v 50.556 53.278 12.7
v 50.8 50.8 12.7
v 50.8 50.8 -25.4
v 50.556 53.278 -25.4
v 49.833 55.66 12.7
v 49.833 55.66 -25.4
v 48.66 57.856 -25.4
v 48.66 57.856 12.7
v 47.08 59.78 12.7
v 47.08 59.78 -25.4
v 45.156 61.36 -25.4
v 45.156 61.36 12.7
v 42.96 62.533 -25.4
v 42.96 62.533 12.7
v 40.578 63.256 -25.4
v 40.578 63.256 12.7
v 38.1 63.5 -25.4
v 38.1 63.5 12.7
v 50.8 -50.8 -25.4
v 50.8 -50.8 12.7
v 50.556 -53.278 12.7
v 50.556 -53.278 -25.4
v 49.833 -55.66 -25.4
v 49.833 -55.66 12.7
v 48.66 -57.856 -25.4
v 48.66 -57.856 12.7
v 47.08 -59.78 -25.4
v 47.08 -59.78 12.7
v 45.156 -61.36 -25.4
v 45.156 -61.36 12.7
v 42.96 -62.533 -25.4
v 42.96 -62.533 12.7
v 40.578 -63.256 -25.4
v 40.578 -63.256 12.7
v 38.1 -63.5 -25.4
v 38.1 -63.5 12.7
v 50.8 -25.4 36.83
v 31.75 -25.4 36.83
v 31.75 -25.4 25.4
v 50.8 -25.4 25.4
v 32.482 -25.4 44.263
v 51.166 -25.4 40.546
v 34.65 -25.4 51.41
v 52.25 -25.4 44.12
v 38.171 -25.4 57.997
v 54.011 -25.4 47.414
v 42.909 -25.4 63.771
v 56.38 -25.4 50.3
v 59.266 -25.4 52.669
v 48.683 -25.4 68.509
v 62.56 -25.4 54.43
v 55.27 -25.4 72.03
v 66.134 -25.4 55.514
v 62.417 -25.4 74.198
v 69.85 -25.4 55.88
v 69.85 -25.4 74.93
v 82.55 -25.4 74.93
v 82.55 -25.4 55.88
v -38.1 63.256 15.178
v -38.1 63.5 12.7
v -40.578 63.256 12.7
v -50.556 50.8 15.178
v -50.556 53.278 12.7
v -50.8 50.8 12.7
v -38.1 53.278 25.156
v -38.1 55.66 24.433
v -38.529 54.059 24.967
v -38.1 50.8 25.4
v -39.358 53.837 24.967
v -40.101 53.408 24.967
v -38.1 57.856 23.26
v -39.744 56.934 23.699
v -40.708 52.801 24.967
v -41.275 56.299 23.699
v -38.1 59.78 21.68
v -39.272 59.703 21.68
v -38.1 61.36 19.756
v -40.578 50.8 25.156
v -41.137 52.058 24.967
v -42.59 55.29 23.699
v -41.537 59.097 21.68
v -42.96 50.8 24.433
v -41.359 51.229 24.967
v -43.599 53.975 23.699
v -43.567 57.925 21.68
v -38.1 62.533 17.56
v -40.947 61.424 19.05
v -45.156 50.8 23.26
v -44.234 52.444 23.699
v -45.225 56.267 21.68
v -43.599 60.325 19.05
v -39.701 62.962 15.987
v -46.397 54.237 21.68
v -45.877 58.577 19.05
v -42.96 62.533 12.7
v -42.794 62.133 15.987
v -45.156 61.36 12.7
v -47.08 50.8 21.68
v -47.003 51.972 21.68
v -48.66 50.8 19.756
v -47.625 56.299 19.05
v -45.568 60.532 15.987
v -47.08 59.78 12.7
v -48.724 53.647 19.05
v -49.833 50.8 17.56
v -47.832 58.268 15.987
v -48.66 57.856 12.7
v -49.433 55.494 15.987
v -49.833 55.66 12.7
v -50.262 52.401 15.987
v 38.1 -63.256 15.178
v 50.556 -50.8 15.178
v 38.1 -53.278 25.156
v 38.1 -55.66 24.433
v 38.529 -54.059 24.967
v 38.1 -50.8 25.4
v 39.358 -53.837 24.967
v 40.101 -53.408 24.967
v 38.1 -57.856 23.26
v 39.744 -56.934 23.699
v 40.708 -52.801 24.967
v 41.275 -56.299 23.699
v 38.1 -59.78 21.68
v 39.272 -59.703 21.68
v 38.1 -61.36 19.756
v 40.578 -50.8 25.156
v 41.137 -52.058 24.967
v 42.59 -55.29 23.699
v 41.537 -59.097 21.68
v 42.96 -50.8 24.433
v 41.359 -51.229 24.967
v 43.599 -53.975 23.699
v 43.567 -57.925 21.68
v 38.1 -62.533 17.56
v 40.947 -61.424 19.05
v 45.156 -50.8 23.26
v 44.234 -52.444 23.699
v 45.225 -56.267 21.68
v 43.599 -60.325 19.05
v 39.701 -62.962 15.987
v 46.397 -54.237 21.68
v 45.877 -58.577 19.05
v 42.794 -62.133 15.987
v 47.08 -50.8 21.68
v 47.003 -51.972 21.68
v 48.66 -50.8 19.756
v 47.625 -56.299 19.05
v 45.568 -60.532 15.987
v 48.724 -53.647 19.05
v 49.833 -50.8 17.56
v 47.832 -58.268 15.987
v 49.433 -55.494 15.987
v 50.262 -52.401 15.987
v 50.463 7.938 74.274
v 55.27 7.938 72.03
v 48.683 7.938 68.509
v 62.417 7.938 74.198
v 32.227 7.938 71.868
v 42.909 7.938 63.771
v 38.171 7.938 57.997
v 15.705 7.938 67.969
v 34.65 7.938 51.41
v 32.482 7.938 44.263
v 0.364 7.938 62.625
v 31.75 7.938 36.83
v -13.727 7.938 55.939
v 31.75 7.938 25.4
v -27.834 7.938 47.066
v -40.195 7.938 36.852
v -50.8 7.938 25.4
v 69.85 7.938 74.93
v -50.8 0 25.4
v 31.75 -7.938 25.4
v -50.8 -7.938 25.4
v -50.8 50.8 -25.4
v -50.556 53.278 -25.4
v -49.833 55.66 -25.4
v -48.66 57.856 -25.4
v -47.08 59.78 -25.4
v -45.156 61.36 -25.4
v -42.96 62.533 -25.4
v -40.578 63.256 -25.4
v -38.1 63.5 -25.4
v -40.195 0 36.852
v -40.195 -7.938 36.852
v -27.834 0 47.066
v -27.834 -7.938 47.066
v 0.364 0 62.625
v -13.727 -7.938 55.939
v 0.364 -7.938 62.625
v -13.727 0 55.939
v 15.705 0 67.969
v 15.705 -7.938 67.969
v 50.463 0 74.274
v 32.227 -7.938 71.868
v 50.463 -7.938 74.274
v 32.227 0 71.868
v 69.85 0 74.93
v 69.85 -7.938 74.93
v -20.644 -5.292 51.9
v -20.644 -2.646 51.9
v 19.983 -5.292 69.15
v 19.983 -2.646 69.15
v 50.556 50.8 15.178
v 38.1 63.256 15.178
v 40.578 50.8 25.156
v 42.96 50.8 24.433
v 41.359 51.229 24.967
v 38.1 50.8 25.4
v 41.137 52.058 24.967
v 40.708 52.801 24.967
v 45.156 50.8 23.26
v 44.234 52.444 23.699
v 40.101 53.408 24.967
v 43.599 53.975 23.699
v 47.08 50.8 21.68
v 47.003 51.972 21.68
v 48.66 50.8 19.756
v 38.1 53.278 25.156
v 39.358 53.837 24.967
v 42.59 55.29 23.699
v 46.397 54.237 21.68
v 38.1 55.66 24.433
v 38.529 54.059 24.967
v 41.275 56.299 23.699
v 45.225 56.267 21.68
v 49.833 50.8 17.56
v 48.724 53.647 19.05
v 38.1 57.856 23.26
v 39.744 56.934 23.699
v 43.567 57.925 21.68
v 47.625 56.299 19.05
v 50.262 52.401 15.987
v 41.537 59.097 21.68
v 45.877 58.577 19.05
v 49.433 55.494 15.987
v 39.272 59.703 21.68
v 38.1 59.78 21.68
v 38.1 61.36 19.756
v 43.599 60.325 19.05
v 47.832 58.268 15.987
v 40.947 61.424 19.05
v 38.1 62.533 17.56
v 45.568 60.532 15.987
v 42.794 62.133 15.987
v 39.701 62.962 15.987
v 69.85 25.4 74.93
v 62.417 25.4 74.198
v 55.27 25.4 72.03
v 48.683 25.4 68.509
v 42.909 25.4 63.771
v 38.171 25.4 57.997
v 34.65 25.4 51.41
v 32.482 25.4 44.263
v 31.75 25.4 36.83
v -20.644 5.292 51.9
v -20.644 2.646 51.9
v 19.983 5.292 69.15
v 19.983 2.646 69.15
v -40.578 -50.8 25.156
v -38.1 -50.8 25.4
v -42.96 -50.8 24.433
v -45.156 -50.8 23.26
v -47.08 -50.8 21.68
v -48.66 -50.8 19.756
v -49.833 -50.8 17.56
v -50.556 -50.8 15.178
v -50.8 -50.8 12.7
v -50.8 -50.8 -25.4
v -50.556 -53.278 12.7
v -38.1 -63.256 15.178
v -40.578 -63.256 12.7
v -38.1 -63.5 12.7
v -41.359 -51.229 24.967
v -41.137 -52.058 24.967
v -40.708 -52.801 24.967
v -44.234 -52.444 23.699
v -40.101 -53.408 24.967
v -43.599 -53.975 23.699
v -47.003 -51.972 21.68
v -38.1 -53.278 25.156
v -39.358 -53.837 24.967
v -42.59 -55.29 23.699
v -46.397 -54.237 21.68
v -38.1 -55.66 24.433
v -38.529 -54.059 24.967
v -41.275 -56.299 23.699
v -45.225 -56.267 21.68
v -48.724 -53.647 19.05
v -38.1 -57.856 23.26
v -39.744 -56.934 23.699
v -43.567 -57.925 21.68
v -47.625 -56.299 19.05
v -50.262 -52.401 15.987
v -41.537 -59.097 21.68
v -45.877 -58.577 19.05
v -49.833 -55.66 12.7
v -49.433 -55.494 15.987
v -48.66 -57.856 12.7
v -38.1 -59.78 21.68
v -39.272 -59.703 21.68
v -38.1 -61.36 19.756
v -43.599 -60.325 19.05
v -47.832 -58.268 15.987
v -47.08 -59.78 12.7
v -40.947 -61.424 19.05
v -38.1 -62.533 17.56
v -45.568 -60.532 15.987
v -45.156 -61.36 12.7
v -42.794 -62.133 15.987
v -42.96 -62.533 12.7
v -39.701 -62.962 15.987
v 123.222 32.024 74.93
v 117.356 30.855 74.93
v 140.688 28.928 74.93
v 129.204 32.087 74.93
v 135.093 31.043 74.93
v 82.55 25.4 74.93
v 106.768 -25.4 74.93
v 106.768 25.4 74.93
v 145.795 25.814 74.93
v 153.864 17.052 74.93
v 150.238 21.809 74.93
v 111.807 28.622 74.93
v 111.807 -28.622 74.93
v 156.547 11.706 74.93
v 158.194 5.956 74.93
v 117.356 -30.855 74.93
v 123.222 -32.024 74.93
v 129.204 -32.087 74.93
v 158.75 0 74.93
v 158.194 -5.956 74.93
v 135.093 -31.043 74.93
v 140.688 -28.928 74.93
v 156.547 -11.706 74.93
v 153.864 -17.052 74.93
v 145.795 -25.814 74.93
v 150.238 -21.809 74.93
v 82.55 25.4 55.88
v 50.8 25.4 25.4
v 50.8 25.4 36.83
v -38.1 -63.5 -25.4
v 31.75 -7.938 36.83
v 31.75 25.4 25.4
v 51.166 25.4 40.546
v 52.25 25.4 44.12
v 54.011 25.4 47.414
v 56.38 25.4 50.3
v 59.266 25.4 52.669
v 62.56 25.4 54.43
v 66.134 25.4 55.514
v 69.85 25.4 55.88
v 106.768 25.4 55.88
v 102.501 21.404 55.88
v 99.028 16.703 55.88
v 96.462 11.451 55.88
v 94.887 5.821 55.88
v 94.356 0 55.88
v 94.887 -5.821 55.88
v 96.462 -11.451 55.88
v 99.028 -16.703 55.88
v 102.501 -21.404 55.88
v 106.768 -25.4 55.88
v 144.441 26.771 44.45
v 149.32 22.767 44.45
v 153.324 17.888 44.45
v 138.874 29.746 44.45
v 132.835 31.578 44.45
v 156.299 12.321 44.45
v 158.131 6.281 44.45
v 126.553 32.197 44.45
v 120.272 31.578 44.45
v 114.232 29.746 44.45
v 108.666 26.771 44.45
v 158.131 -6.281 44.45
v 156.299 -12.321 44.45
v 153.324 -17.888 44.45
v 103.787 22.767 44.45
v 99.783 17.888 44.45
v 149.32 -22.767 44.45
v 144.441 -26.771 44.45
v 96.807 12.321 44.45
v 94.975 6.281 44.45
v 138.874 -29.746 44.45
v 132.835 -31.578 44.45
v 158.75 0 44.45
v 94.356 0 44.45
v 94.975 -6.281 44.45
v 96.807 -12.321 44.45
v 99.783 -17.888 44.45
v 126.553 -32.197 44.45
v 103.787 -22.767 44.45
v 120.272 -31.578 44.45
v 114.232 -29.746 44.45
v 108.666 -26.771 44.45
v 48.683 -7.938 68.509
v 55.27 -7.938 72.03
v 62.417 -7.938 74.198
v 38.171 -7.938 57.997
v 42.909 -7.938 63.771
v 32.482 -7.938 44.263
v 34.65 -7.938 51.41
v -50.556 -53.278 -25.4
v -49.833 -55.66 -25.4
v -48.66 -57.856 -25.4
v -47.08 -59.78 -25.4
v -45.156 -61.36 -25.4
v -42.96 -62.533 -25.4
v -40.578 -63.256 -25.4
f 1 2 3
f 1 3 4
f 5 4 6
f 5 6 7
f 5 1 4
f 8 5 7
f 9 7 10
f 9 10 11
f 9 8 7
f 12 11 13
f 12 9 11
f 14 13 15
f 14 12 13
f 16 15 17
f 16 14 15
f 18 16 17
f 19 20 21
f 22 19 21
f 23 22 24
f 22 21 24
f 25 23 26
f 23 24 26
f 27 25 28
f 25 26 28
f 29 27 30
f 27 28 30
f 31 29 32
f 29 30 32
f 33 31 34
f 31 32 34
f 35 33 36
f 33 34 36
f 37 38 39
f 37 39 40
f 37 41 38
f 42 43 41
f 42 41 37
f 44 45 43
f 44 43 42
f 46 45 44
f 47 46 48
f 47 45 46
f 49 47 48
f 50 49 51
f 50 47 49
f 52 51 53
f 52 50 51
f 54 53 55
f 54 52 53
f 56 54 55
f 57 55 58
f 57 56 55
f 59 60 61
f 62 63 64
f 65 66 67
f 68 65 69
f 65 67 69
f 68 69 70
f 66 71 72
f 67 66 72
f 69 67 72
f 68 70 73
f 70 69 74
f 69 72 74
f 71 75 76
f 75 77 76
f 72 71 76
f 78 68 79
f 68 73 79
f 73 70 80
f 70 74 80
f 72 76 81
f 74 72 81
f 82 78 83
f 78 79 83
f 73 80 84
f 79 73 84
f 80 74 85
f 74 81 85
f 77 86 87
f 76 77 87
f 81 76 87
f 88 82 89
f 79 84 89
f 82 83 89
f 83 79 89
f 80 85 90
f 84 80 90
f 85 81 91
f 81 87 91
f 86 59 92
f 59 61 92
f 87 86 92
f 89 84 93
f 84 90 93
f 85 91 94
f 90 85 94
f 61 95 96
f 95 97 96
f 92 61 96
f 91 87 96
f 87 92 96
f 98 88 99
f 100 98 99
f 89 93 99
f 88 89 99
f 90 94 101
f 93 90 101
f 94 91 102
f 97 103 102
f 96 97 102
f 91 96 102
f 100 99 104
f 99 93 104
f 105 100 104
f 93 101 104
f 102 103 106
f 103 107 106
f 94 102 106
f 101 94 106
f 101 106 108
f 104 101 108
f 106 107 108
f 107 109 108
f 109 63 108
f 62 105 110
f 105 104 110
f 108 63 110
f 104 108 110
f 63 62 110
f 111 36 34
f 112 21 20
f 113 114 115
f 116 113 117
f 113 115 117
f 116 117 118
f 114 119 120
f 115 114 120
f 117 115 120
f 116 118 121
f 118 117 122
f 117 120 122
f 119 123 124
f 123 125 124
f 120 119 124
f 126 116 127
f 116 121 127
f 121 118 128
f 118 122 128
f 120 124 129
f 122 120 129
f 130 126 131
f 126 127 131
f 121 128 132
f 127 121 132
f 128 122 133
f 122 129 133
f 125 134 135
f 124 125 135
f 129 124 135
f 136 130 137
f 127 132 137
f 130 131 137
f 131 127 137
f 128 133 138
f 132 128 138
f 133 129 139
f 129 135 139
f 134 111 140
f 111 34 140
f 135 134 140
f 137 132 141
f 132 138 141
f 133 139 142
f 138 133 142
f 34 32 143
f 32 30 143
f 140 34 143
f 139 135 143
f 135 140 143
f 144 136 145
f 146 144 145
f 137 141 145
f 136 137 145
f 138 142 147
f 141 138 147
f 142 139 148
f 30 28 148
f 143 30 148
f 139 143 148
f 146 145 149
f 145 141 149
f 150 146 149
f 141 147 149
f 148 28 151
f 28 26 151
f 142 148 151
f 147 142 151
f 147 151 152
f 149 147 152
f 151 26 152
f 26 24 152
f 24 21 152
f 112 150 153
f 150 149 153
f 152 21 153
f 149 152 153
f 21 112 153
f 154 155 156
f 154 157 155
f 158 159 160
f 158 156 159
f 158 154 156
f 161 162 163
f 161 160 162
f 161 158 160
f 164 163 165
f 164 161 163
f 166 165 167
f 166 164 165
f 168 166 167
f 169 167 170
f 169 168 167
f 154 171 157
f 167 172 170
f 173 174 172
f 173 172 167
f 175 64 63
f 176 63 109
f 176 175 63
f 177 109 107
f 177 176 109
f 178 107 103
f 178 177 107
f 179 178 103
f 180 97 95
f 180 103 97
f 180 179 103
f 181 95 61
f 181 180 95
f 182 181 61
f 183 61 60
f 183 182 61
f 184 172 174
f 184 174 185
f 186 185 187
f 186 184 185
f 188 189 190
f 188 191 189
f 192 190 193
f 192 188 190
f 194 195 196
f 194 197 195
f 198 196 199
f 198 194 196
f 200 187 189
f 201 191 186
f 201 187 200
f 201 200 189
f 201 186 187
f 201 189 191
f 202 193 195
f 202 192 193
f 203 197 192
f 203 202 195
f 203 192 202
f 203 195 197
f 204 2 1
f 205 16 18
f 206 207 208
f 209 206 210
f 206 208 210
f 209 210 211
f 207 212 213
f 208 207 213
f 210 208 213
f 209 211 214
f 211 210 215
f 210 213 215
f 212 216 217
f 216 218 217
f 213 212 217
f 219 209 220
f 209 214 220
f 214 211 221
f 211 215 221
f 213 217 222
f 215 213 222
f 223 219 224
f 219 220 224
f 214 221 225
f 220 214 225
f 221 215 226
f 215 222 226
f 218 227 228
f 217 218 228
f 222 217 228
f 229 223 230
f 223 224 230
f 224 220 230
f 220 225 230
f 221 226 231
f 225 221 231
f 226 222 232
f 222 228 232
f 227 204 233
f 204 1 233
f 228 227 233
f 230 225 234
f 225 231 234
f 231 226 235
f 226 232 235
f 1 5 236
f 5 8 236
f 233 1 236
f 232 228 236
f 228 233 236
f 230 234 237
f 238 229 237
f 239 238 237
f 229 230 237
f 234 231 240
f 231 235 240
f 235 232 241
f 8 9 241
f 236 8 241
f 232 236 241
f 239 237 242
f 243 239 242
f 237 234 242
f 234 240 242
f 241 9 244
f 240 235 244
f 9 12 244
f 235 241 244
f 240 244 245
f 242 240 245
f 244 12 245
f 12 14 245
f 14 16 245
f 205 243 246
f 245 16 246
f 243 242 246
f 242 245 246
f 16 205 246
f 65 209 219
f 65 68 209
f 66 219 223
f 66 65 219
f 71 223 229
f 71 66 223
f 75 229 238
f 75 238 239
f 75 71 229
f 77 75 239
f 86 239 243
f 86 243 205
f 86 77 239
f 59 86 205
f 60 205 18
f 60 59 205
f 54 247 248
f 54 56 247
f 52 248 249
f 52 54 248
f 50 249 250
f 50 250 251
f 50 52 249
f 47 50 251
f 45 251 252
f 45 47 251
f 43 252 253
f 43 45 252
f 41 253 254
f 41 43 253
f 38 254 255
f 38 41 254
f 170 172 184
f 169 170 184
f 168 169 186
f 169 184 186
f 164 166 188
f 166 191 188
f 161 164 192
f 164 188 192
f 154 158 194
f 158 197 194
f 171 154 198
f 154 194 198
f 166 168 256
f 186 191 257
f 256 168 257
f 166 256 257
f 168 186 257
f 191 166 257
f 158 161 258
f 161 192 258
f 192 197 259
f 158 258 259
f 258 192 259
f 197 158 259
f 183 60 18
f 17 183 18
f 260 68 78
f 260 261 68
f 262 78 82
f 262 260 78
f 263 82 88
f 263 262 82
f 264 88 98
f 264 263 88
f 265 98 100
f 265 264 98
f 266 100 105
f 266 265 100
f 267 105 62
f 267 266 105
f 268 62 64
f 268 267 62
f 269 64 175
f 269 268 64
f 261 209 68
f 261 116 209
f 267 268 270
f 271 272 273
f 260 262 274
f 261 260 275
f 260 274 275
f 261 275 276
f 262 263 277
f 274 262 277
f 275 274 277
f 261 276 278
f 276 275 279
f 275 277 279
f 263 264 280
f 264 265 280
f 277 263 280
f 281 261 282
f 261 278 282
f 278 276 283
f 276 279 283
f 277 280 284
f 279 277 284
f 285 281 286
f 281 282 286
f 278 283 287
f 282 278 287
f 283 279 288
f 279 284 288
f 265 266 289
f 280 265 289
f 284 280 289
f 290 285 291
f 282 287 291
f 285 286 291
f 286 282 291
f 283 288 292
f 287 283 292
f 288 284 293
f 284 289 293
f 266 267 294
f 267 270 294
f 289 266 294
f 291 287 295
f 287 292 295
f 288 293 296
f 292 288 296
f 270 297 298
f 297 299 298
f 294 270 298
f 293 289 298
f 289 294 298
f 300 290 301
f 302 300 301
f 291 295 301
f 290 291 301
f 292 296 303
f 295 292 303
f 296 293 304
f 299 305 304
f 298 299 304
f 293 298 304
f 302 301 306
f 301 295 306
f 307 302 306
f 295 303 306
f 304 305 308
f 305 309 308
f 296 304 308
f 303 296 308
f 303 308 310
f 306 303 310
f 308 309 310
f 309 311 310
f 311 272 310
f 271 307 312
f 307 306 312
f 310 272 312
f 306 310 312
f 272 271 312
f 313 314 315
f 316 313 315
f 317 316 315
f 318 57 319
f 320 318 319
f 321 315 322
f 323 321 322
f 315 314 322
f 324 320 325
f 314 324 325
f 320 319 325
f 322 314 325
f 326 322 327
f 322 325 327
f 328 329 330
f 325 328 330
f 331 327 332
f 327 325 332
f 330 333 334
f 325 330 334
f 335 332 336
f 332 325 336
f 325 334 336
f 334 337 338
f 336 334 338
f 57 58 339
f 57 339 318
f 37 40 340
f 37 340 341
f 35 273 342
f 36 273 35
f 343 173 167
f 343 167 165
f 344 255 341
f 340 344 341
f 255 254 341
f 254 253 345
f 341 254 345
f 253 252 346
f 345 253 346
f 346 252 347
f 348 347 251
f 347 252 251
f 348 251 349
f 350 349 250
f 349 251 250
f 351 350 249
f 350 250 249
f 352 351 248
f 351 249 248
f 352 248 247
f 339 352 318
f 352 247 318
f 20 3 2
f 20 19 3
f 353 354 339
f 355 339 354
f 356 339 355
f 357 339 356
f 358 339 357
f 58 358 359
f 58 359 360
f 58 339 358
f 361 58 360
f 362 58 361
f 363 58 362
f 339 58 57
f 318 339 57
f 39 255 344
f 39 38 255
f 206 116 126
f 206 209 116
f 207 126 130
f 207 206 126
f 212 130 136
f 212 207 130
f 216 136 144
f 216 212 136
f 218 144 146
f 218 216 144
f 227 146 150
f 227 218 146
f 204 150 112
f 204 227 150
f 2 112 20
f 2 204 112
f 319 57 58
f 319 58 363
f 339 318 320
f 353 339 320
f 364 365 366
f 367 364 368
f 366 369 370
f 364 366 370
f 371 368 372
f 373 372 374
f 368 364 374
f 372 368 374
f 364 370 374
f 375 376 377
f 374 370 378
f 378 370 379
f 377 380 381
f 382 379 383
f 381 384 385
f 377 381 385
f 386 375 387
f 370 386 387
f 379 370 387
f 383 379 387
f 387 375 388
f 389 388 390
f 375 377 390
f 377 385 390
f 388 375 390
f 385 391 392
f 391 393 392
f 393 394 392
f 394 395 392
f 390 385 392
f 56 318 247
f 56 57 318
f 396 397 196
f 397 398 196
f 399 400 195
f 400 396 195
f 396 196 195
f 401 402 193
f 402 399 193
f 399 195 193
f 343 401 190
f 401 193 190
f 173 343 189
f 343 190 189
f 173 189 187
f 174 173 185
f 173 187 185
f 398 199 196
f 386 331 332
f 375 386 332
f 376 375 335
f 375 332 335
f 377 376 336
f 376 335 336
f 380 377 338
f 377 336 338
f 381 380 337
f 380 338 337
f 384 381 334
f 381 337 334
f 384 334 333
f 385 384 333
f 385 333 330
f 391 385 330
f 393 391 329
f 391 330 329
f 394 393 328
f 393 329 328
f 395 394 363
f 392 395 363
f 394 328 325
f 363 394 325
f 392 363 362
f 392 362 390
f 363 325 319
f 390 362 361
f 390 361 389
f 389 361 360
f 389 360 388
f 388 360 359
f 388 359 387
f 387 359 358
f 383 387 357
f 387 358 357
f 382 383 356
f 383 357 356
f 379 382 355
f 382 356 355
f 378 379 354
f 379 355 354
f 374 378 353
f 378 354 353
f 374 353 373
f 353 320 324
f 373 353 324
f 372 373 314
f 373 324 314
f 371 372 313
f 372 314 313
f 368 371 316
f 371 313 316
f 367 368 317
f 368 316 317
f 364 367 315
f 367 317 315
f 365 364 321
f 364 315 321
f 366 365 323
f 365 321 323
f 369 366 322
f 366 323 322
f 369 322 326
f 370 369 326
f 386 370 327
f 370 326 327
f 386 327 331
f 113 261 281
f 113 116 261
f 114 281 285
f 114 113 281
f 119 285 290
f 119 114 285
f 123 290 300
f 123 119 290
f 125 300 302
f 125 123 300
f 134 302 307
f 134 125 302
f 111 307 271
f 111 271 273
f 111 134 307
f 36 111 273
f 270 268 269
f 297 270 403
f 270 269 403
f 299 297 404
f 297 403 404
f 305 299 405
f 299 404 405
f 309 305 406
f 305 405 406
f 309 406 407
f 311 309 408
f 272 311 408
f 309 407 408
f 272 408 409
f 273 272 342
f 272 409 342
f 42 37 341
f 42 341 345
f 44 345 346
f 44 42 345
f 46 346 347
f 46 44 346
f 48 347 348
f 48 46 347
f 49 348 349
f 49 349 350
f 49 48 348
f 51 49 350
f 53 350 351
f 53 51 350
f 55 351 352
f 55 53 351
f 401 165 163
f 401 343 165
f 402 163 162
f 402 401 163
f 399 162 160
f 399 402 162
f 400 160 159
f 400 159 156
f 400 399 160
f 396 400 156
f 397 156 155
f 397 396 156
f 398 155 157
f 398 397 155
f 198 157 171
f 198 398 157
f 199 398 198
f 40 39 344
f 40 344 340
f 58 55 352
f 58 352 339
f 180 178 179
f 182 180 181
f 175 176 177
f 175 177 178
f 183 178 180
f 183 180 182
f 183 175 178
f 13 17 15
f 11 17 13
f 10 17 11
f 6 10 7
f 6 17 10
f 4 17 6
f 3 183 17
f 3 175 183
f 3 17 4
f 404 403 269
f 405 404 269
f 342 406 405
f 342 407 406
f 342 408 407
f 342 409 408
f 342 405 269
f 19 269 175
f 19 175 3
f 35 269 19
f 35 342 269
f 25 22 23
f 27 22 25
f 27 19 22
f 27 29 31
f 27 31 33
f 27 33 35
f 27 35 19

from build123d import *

# Parameters (mm, degrees)
F0_W     = 44.0032443145
F0_H     = 19.05
F1_DEPTH = 25.4
F2_DEPTH = 63.5
F3_DEPTH = 7.9375
F5_DEPTH = 25.4
F6_R     = 12.7
F7_R     = 12.7


with BuildPart() as f1:
    # F0 (on Front) → F1 (new body, symmetric)
    with BuildSketch(Plane.XZ):
        with Locations((104.5516221572, 65.405)):
            Rectangle(F0_W, F0_H)
    extrude(amount=F1_DEPTH, both=True)

    # F0 (on Front) → F4 (revolve)
    with BuildSketch(Plane.XZ):
        Polygon((158.75, 74.93), (126.5532443145, 74.93), (126.5532443145, 55.88), (126.5532443145, 44.45), (158.75, 44.45), align=None)
    revolve(axis=Axis((126.5532443145, 0, 59.69), (0, 0, -1)))


with BuildPart() as f2:
    # F0 (on Front) → F2 (new body, symmetric)
    with BuildSketch(Plane.XZ):
        Polygon((31.75, 25.4), (-50.8, 25.4), (-50.8, -25.4), (50.8, -25.4), (50.8, 25.4), align=None)
    extrude(amount=F2_DEPTH, both=True)

    # F6
    f6_edges = [f2.edges().sort_by_distance(p)[0] for p in [
        (50.8, -63.5, 0),
        (-50.8, -63.5, 0),
        (-50.8, 63.5, 0),
        (50.8, 63.5, 0),
    ]]
    fillet(f6_edges, radius=F6_R)

    # F7
    f7_edges = [f2.edges().sort_by_distance(p)[0] for p in [
        (0, 63.5, 25.4),
        (-50.8, 0, 25.4),
        (0, -63.5, 25.4),
        (50.8, 0, 25.4),
    ]]
    fillet(f7_edges, radius=F7_R)


with BuildPart() as f3:
    # F0 (on Front) → F3 (new body, symmetric)
    with BuildSketch(Plane.XZ):
        with BuildLine():
            add(Edge.make_bspline(
                [(-50.8, 25.4), (-26.2902118266, 55.7845644653), (15.7740116119, 75.6253525615), (69.85, 74.93)],
                knots=[0, 0, 0, 0, 130.421023612, 130.421023612, 130.421023612, 130.421023612], degree=3))
            Line((-50.8, 25.4), (31.75, 25.4))
            Line((31.75, 25.4), (31.75, 36.83))
            ThreePointArc((31.75, 36.83), (42.9092316368, 63.7707683632), (69.85, 74.93))
        make_face()
    extrude(amount=F3_DEPTH, both=True)


with BuildPart() as f5:
    # F0 (on Front) → F5 (new body, symmetric)
    with BuildSketch(Plane.XZ):
        with BuildLine():
            Line((31.75, 36.83), (31.75, 25.4))
            Line((31.75, 25.4), (50.8, 25.4))
            Line((50.8, 25.4), (50.8, 36.83))
            ThreePointArc((50.8, 36.83), (56.3796158184, 50.3003841816), (69.85, 55.88))
            Line((69.85, 55.88), (82.55, 55.88))
            Line((82.55, 55.88), (82.55, 74.93))
            Line((82.55, 74.93), (69.85, 74.93))
            ThreePointArc((69.85, 74.93), (42.9092316368, 63.7707683632), (31.75, 36.83))
        make_face()
    extrude(amount=F5_DEPTH, both=True)


solid = Compound([f1.part, f2.part, f3.part, f5.part])
